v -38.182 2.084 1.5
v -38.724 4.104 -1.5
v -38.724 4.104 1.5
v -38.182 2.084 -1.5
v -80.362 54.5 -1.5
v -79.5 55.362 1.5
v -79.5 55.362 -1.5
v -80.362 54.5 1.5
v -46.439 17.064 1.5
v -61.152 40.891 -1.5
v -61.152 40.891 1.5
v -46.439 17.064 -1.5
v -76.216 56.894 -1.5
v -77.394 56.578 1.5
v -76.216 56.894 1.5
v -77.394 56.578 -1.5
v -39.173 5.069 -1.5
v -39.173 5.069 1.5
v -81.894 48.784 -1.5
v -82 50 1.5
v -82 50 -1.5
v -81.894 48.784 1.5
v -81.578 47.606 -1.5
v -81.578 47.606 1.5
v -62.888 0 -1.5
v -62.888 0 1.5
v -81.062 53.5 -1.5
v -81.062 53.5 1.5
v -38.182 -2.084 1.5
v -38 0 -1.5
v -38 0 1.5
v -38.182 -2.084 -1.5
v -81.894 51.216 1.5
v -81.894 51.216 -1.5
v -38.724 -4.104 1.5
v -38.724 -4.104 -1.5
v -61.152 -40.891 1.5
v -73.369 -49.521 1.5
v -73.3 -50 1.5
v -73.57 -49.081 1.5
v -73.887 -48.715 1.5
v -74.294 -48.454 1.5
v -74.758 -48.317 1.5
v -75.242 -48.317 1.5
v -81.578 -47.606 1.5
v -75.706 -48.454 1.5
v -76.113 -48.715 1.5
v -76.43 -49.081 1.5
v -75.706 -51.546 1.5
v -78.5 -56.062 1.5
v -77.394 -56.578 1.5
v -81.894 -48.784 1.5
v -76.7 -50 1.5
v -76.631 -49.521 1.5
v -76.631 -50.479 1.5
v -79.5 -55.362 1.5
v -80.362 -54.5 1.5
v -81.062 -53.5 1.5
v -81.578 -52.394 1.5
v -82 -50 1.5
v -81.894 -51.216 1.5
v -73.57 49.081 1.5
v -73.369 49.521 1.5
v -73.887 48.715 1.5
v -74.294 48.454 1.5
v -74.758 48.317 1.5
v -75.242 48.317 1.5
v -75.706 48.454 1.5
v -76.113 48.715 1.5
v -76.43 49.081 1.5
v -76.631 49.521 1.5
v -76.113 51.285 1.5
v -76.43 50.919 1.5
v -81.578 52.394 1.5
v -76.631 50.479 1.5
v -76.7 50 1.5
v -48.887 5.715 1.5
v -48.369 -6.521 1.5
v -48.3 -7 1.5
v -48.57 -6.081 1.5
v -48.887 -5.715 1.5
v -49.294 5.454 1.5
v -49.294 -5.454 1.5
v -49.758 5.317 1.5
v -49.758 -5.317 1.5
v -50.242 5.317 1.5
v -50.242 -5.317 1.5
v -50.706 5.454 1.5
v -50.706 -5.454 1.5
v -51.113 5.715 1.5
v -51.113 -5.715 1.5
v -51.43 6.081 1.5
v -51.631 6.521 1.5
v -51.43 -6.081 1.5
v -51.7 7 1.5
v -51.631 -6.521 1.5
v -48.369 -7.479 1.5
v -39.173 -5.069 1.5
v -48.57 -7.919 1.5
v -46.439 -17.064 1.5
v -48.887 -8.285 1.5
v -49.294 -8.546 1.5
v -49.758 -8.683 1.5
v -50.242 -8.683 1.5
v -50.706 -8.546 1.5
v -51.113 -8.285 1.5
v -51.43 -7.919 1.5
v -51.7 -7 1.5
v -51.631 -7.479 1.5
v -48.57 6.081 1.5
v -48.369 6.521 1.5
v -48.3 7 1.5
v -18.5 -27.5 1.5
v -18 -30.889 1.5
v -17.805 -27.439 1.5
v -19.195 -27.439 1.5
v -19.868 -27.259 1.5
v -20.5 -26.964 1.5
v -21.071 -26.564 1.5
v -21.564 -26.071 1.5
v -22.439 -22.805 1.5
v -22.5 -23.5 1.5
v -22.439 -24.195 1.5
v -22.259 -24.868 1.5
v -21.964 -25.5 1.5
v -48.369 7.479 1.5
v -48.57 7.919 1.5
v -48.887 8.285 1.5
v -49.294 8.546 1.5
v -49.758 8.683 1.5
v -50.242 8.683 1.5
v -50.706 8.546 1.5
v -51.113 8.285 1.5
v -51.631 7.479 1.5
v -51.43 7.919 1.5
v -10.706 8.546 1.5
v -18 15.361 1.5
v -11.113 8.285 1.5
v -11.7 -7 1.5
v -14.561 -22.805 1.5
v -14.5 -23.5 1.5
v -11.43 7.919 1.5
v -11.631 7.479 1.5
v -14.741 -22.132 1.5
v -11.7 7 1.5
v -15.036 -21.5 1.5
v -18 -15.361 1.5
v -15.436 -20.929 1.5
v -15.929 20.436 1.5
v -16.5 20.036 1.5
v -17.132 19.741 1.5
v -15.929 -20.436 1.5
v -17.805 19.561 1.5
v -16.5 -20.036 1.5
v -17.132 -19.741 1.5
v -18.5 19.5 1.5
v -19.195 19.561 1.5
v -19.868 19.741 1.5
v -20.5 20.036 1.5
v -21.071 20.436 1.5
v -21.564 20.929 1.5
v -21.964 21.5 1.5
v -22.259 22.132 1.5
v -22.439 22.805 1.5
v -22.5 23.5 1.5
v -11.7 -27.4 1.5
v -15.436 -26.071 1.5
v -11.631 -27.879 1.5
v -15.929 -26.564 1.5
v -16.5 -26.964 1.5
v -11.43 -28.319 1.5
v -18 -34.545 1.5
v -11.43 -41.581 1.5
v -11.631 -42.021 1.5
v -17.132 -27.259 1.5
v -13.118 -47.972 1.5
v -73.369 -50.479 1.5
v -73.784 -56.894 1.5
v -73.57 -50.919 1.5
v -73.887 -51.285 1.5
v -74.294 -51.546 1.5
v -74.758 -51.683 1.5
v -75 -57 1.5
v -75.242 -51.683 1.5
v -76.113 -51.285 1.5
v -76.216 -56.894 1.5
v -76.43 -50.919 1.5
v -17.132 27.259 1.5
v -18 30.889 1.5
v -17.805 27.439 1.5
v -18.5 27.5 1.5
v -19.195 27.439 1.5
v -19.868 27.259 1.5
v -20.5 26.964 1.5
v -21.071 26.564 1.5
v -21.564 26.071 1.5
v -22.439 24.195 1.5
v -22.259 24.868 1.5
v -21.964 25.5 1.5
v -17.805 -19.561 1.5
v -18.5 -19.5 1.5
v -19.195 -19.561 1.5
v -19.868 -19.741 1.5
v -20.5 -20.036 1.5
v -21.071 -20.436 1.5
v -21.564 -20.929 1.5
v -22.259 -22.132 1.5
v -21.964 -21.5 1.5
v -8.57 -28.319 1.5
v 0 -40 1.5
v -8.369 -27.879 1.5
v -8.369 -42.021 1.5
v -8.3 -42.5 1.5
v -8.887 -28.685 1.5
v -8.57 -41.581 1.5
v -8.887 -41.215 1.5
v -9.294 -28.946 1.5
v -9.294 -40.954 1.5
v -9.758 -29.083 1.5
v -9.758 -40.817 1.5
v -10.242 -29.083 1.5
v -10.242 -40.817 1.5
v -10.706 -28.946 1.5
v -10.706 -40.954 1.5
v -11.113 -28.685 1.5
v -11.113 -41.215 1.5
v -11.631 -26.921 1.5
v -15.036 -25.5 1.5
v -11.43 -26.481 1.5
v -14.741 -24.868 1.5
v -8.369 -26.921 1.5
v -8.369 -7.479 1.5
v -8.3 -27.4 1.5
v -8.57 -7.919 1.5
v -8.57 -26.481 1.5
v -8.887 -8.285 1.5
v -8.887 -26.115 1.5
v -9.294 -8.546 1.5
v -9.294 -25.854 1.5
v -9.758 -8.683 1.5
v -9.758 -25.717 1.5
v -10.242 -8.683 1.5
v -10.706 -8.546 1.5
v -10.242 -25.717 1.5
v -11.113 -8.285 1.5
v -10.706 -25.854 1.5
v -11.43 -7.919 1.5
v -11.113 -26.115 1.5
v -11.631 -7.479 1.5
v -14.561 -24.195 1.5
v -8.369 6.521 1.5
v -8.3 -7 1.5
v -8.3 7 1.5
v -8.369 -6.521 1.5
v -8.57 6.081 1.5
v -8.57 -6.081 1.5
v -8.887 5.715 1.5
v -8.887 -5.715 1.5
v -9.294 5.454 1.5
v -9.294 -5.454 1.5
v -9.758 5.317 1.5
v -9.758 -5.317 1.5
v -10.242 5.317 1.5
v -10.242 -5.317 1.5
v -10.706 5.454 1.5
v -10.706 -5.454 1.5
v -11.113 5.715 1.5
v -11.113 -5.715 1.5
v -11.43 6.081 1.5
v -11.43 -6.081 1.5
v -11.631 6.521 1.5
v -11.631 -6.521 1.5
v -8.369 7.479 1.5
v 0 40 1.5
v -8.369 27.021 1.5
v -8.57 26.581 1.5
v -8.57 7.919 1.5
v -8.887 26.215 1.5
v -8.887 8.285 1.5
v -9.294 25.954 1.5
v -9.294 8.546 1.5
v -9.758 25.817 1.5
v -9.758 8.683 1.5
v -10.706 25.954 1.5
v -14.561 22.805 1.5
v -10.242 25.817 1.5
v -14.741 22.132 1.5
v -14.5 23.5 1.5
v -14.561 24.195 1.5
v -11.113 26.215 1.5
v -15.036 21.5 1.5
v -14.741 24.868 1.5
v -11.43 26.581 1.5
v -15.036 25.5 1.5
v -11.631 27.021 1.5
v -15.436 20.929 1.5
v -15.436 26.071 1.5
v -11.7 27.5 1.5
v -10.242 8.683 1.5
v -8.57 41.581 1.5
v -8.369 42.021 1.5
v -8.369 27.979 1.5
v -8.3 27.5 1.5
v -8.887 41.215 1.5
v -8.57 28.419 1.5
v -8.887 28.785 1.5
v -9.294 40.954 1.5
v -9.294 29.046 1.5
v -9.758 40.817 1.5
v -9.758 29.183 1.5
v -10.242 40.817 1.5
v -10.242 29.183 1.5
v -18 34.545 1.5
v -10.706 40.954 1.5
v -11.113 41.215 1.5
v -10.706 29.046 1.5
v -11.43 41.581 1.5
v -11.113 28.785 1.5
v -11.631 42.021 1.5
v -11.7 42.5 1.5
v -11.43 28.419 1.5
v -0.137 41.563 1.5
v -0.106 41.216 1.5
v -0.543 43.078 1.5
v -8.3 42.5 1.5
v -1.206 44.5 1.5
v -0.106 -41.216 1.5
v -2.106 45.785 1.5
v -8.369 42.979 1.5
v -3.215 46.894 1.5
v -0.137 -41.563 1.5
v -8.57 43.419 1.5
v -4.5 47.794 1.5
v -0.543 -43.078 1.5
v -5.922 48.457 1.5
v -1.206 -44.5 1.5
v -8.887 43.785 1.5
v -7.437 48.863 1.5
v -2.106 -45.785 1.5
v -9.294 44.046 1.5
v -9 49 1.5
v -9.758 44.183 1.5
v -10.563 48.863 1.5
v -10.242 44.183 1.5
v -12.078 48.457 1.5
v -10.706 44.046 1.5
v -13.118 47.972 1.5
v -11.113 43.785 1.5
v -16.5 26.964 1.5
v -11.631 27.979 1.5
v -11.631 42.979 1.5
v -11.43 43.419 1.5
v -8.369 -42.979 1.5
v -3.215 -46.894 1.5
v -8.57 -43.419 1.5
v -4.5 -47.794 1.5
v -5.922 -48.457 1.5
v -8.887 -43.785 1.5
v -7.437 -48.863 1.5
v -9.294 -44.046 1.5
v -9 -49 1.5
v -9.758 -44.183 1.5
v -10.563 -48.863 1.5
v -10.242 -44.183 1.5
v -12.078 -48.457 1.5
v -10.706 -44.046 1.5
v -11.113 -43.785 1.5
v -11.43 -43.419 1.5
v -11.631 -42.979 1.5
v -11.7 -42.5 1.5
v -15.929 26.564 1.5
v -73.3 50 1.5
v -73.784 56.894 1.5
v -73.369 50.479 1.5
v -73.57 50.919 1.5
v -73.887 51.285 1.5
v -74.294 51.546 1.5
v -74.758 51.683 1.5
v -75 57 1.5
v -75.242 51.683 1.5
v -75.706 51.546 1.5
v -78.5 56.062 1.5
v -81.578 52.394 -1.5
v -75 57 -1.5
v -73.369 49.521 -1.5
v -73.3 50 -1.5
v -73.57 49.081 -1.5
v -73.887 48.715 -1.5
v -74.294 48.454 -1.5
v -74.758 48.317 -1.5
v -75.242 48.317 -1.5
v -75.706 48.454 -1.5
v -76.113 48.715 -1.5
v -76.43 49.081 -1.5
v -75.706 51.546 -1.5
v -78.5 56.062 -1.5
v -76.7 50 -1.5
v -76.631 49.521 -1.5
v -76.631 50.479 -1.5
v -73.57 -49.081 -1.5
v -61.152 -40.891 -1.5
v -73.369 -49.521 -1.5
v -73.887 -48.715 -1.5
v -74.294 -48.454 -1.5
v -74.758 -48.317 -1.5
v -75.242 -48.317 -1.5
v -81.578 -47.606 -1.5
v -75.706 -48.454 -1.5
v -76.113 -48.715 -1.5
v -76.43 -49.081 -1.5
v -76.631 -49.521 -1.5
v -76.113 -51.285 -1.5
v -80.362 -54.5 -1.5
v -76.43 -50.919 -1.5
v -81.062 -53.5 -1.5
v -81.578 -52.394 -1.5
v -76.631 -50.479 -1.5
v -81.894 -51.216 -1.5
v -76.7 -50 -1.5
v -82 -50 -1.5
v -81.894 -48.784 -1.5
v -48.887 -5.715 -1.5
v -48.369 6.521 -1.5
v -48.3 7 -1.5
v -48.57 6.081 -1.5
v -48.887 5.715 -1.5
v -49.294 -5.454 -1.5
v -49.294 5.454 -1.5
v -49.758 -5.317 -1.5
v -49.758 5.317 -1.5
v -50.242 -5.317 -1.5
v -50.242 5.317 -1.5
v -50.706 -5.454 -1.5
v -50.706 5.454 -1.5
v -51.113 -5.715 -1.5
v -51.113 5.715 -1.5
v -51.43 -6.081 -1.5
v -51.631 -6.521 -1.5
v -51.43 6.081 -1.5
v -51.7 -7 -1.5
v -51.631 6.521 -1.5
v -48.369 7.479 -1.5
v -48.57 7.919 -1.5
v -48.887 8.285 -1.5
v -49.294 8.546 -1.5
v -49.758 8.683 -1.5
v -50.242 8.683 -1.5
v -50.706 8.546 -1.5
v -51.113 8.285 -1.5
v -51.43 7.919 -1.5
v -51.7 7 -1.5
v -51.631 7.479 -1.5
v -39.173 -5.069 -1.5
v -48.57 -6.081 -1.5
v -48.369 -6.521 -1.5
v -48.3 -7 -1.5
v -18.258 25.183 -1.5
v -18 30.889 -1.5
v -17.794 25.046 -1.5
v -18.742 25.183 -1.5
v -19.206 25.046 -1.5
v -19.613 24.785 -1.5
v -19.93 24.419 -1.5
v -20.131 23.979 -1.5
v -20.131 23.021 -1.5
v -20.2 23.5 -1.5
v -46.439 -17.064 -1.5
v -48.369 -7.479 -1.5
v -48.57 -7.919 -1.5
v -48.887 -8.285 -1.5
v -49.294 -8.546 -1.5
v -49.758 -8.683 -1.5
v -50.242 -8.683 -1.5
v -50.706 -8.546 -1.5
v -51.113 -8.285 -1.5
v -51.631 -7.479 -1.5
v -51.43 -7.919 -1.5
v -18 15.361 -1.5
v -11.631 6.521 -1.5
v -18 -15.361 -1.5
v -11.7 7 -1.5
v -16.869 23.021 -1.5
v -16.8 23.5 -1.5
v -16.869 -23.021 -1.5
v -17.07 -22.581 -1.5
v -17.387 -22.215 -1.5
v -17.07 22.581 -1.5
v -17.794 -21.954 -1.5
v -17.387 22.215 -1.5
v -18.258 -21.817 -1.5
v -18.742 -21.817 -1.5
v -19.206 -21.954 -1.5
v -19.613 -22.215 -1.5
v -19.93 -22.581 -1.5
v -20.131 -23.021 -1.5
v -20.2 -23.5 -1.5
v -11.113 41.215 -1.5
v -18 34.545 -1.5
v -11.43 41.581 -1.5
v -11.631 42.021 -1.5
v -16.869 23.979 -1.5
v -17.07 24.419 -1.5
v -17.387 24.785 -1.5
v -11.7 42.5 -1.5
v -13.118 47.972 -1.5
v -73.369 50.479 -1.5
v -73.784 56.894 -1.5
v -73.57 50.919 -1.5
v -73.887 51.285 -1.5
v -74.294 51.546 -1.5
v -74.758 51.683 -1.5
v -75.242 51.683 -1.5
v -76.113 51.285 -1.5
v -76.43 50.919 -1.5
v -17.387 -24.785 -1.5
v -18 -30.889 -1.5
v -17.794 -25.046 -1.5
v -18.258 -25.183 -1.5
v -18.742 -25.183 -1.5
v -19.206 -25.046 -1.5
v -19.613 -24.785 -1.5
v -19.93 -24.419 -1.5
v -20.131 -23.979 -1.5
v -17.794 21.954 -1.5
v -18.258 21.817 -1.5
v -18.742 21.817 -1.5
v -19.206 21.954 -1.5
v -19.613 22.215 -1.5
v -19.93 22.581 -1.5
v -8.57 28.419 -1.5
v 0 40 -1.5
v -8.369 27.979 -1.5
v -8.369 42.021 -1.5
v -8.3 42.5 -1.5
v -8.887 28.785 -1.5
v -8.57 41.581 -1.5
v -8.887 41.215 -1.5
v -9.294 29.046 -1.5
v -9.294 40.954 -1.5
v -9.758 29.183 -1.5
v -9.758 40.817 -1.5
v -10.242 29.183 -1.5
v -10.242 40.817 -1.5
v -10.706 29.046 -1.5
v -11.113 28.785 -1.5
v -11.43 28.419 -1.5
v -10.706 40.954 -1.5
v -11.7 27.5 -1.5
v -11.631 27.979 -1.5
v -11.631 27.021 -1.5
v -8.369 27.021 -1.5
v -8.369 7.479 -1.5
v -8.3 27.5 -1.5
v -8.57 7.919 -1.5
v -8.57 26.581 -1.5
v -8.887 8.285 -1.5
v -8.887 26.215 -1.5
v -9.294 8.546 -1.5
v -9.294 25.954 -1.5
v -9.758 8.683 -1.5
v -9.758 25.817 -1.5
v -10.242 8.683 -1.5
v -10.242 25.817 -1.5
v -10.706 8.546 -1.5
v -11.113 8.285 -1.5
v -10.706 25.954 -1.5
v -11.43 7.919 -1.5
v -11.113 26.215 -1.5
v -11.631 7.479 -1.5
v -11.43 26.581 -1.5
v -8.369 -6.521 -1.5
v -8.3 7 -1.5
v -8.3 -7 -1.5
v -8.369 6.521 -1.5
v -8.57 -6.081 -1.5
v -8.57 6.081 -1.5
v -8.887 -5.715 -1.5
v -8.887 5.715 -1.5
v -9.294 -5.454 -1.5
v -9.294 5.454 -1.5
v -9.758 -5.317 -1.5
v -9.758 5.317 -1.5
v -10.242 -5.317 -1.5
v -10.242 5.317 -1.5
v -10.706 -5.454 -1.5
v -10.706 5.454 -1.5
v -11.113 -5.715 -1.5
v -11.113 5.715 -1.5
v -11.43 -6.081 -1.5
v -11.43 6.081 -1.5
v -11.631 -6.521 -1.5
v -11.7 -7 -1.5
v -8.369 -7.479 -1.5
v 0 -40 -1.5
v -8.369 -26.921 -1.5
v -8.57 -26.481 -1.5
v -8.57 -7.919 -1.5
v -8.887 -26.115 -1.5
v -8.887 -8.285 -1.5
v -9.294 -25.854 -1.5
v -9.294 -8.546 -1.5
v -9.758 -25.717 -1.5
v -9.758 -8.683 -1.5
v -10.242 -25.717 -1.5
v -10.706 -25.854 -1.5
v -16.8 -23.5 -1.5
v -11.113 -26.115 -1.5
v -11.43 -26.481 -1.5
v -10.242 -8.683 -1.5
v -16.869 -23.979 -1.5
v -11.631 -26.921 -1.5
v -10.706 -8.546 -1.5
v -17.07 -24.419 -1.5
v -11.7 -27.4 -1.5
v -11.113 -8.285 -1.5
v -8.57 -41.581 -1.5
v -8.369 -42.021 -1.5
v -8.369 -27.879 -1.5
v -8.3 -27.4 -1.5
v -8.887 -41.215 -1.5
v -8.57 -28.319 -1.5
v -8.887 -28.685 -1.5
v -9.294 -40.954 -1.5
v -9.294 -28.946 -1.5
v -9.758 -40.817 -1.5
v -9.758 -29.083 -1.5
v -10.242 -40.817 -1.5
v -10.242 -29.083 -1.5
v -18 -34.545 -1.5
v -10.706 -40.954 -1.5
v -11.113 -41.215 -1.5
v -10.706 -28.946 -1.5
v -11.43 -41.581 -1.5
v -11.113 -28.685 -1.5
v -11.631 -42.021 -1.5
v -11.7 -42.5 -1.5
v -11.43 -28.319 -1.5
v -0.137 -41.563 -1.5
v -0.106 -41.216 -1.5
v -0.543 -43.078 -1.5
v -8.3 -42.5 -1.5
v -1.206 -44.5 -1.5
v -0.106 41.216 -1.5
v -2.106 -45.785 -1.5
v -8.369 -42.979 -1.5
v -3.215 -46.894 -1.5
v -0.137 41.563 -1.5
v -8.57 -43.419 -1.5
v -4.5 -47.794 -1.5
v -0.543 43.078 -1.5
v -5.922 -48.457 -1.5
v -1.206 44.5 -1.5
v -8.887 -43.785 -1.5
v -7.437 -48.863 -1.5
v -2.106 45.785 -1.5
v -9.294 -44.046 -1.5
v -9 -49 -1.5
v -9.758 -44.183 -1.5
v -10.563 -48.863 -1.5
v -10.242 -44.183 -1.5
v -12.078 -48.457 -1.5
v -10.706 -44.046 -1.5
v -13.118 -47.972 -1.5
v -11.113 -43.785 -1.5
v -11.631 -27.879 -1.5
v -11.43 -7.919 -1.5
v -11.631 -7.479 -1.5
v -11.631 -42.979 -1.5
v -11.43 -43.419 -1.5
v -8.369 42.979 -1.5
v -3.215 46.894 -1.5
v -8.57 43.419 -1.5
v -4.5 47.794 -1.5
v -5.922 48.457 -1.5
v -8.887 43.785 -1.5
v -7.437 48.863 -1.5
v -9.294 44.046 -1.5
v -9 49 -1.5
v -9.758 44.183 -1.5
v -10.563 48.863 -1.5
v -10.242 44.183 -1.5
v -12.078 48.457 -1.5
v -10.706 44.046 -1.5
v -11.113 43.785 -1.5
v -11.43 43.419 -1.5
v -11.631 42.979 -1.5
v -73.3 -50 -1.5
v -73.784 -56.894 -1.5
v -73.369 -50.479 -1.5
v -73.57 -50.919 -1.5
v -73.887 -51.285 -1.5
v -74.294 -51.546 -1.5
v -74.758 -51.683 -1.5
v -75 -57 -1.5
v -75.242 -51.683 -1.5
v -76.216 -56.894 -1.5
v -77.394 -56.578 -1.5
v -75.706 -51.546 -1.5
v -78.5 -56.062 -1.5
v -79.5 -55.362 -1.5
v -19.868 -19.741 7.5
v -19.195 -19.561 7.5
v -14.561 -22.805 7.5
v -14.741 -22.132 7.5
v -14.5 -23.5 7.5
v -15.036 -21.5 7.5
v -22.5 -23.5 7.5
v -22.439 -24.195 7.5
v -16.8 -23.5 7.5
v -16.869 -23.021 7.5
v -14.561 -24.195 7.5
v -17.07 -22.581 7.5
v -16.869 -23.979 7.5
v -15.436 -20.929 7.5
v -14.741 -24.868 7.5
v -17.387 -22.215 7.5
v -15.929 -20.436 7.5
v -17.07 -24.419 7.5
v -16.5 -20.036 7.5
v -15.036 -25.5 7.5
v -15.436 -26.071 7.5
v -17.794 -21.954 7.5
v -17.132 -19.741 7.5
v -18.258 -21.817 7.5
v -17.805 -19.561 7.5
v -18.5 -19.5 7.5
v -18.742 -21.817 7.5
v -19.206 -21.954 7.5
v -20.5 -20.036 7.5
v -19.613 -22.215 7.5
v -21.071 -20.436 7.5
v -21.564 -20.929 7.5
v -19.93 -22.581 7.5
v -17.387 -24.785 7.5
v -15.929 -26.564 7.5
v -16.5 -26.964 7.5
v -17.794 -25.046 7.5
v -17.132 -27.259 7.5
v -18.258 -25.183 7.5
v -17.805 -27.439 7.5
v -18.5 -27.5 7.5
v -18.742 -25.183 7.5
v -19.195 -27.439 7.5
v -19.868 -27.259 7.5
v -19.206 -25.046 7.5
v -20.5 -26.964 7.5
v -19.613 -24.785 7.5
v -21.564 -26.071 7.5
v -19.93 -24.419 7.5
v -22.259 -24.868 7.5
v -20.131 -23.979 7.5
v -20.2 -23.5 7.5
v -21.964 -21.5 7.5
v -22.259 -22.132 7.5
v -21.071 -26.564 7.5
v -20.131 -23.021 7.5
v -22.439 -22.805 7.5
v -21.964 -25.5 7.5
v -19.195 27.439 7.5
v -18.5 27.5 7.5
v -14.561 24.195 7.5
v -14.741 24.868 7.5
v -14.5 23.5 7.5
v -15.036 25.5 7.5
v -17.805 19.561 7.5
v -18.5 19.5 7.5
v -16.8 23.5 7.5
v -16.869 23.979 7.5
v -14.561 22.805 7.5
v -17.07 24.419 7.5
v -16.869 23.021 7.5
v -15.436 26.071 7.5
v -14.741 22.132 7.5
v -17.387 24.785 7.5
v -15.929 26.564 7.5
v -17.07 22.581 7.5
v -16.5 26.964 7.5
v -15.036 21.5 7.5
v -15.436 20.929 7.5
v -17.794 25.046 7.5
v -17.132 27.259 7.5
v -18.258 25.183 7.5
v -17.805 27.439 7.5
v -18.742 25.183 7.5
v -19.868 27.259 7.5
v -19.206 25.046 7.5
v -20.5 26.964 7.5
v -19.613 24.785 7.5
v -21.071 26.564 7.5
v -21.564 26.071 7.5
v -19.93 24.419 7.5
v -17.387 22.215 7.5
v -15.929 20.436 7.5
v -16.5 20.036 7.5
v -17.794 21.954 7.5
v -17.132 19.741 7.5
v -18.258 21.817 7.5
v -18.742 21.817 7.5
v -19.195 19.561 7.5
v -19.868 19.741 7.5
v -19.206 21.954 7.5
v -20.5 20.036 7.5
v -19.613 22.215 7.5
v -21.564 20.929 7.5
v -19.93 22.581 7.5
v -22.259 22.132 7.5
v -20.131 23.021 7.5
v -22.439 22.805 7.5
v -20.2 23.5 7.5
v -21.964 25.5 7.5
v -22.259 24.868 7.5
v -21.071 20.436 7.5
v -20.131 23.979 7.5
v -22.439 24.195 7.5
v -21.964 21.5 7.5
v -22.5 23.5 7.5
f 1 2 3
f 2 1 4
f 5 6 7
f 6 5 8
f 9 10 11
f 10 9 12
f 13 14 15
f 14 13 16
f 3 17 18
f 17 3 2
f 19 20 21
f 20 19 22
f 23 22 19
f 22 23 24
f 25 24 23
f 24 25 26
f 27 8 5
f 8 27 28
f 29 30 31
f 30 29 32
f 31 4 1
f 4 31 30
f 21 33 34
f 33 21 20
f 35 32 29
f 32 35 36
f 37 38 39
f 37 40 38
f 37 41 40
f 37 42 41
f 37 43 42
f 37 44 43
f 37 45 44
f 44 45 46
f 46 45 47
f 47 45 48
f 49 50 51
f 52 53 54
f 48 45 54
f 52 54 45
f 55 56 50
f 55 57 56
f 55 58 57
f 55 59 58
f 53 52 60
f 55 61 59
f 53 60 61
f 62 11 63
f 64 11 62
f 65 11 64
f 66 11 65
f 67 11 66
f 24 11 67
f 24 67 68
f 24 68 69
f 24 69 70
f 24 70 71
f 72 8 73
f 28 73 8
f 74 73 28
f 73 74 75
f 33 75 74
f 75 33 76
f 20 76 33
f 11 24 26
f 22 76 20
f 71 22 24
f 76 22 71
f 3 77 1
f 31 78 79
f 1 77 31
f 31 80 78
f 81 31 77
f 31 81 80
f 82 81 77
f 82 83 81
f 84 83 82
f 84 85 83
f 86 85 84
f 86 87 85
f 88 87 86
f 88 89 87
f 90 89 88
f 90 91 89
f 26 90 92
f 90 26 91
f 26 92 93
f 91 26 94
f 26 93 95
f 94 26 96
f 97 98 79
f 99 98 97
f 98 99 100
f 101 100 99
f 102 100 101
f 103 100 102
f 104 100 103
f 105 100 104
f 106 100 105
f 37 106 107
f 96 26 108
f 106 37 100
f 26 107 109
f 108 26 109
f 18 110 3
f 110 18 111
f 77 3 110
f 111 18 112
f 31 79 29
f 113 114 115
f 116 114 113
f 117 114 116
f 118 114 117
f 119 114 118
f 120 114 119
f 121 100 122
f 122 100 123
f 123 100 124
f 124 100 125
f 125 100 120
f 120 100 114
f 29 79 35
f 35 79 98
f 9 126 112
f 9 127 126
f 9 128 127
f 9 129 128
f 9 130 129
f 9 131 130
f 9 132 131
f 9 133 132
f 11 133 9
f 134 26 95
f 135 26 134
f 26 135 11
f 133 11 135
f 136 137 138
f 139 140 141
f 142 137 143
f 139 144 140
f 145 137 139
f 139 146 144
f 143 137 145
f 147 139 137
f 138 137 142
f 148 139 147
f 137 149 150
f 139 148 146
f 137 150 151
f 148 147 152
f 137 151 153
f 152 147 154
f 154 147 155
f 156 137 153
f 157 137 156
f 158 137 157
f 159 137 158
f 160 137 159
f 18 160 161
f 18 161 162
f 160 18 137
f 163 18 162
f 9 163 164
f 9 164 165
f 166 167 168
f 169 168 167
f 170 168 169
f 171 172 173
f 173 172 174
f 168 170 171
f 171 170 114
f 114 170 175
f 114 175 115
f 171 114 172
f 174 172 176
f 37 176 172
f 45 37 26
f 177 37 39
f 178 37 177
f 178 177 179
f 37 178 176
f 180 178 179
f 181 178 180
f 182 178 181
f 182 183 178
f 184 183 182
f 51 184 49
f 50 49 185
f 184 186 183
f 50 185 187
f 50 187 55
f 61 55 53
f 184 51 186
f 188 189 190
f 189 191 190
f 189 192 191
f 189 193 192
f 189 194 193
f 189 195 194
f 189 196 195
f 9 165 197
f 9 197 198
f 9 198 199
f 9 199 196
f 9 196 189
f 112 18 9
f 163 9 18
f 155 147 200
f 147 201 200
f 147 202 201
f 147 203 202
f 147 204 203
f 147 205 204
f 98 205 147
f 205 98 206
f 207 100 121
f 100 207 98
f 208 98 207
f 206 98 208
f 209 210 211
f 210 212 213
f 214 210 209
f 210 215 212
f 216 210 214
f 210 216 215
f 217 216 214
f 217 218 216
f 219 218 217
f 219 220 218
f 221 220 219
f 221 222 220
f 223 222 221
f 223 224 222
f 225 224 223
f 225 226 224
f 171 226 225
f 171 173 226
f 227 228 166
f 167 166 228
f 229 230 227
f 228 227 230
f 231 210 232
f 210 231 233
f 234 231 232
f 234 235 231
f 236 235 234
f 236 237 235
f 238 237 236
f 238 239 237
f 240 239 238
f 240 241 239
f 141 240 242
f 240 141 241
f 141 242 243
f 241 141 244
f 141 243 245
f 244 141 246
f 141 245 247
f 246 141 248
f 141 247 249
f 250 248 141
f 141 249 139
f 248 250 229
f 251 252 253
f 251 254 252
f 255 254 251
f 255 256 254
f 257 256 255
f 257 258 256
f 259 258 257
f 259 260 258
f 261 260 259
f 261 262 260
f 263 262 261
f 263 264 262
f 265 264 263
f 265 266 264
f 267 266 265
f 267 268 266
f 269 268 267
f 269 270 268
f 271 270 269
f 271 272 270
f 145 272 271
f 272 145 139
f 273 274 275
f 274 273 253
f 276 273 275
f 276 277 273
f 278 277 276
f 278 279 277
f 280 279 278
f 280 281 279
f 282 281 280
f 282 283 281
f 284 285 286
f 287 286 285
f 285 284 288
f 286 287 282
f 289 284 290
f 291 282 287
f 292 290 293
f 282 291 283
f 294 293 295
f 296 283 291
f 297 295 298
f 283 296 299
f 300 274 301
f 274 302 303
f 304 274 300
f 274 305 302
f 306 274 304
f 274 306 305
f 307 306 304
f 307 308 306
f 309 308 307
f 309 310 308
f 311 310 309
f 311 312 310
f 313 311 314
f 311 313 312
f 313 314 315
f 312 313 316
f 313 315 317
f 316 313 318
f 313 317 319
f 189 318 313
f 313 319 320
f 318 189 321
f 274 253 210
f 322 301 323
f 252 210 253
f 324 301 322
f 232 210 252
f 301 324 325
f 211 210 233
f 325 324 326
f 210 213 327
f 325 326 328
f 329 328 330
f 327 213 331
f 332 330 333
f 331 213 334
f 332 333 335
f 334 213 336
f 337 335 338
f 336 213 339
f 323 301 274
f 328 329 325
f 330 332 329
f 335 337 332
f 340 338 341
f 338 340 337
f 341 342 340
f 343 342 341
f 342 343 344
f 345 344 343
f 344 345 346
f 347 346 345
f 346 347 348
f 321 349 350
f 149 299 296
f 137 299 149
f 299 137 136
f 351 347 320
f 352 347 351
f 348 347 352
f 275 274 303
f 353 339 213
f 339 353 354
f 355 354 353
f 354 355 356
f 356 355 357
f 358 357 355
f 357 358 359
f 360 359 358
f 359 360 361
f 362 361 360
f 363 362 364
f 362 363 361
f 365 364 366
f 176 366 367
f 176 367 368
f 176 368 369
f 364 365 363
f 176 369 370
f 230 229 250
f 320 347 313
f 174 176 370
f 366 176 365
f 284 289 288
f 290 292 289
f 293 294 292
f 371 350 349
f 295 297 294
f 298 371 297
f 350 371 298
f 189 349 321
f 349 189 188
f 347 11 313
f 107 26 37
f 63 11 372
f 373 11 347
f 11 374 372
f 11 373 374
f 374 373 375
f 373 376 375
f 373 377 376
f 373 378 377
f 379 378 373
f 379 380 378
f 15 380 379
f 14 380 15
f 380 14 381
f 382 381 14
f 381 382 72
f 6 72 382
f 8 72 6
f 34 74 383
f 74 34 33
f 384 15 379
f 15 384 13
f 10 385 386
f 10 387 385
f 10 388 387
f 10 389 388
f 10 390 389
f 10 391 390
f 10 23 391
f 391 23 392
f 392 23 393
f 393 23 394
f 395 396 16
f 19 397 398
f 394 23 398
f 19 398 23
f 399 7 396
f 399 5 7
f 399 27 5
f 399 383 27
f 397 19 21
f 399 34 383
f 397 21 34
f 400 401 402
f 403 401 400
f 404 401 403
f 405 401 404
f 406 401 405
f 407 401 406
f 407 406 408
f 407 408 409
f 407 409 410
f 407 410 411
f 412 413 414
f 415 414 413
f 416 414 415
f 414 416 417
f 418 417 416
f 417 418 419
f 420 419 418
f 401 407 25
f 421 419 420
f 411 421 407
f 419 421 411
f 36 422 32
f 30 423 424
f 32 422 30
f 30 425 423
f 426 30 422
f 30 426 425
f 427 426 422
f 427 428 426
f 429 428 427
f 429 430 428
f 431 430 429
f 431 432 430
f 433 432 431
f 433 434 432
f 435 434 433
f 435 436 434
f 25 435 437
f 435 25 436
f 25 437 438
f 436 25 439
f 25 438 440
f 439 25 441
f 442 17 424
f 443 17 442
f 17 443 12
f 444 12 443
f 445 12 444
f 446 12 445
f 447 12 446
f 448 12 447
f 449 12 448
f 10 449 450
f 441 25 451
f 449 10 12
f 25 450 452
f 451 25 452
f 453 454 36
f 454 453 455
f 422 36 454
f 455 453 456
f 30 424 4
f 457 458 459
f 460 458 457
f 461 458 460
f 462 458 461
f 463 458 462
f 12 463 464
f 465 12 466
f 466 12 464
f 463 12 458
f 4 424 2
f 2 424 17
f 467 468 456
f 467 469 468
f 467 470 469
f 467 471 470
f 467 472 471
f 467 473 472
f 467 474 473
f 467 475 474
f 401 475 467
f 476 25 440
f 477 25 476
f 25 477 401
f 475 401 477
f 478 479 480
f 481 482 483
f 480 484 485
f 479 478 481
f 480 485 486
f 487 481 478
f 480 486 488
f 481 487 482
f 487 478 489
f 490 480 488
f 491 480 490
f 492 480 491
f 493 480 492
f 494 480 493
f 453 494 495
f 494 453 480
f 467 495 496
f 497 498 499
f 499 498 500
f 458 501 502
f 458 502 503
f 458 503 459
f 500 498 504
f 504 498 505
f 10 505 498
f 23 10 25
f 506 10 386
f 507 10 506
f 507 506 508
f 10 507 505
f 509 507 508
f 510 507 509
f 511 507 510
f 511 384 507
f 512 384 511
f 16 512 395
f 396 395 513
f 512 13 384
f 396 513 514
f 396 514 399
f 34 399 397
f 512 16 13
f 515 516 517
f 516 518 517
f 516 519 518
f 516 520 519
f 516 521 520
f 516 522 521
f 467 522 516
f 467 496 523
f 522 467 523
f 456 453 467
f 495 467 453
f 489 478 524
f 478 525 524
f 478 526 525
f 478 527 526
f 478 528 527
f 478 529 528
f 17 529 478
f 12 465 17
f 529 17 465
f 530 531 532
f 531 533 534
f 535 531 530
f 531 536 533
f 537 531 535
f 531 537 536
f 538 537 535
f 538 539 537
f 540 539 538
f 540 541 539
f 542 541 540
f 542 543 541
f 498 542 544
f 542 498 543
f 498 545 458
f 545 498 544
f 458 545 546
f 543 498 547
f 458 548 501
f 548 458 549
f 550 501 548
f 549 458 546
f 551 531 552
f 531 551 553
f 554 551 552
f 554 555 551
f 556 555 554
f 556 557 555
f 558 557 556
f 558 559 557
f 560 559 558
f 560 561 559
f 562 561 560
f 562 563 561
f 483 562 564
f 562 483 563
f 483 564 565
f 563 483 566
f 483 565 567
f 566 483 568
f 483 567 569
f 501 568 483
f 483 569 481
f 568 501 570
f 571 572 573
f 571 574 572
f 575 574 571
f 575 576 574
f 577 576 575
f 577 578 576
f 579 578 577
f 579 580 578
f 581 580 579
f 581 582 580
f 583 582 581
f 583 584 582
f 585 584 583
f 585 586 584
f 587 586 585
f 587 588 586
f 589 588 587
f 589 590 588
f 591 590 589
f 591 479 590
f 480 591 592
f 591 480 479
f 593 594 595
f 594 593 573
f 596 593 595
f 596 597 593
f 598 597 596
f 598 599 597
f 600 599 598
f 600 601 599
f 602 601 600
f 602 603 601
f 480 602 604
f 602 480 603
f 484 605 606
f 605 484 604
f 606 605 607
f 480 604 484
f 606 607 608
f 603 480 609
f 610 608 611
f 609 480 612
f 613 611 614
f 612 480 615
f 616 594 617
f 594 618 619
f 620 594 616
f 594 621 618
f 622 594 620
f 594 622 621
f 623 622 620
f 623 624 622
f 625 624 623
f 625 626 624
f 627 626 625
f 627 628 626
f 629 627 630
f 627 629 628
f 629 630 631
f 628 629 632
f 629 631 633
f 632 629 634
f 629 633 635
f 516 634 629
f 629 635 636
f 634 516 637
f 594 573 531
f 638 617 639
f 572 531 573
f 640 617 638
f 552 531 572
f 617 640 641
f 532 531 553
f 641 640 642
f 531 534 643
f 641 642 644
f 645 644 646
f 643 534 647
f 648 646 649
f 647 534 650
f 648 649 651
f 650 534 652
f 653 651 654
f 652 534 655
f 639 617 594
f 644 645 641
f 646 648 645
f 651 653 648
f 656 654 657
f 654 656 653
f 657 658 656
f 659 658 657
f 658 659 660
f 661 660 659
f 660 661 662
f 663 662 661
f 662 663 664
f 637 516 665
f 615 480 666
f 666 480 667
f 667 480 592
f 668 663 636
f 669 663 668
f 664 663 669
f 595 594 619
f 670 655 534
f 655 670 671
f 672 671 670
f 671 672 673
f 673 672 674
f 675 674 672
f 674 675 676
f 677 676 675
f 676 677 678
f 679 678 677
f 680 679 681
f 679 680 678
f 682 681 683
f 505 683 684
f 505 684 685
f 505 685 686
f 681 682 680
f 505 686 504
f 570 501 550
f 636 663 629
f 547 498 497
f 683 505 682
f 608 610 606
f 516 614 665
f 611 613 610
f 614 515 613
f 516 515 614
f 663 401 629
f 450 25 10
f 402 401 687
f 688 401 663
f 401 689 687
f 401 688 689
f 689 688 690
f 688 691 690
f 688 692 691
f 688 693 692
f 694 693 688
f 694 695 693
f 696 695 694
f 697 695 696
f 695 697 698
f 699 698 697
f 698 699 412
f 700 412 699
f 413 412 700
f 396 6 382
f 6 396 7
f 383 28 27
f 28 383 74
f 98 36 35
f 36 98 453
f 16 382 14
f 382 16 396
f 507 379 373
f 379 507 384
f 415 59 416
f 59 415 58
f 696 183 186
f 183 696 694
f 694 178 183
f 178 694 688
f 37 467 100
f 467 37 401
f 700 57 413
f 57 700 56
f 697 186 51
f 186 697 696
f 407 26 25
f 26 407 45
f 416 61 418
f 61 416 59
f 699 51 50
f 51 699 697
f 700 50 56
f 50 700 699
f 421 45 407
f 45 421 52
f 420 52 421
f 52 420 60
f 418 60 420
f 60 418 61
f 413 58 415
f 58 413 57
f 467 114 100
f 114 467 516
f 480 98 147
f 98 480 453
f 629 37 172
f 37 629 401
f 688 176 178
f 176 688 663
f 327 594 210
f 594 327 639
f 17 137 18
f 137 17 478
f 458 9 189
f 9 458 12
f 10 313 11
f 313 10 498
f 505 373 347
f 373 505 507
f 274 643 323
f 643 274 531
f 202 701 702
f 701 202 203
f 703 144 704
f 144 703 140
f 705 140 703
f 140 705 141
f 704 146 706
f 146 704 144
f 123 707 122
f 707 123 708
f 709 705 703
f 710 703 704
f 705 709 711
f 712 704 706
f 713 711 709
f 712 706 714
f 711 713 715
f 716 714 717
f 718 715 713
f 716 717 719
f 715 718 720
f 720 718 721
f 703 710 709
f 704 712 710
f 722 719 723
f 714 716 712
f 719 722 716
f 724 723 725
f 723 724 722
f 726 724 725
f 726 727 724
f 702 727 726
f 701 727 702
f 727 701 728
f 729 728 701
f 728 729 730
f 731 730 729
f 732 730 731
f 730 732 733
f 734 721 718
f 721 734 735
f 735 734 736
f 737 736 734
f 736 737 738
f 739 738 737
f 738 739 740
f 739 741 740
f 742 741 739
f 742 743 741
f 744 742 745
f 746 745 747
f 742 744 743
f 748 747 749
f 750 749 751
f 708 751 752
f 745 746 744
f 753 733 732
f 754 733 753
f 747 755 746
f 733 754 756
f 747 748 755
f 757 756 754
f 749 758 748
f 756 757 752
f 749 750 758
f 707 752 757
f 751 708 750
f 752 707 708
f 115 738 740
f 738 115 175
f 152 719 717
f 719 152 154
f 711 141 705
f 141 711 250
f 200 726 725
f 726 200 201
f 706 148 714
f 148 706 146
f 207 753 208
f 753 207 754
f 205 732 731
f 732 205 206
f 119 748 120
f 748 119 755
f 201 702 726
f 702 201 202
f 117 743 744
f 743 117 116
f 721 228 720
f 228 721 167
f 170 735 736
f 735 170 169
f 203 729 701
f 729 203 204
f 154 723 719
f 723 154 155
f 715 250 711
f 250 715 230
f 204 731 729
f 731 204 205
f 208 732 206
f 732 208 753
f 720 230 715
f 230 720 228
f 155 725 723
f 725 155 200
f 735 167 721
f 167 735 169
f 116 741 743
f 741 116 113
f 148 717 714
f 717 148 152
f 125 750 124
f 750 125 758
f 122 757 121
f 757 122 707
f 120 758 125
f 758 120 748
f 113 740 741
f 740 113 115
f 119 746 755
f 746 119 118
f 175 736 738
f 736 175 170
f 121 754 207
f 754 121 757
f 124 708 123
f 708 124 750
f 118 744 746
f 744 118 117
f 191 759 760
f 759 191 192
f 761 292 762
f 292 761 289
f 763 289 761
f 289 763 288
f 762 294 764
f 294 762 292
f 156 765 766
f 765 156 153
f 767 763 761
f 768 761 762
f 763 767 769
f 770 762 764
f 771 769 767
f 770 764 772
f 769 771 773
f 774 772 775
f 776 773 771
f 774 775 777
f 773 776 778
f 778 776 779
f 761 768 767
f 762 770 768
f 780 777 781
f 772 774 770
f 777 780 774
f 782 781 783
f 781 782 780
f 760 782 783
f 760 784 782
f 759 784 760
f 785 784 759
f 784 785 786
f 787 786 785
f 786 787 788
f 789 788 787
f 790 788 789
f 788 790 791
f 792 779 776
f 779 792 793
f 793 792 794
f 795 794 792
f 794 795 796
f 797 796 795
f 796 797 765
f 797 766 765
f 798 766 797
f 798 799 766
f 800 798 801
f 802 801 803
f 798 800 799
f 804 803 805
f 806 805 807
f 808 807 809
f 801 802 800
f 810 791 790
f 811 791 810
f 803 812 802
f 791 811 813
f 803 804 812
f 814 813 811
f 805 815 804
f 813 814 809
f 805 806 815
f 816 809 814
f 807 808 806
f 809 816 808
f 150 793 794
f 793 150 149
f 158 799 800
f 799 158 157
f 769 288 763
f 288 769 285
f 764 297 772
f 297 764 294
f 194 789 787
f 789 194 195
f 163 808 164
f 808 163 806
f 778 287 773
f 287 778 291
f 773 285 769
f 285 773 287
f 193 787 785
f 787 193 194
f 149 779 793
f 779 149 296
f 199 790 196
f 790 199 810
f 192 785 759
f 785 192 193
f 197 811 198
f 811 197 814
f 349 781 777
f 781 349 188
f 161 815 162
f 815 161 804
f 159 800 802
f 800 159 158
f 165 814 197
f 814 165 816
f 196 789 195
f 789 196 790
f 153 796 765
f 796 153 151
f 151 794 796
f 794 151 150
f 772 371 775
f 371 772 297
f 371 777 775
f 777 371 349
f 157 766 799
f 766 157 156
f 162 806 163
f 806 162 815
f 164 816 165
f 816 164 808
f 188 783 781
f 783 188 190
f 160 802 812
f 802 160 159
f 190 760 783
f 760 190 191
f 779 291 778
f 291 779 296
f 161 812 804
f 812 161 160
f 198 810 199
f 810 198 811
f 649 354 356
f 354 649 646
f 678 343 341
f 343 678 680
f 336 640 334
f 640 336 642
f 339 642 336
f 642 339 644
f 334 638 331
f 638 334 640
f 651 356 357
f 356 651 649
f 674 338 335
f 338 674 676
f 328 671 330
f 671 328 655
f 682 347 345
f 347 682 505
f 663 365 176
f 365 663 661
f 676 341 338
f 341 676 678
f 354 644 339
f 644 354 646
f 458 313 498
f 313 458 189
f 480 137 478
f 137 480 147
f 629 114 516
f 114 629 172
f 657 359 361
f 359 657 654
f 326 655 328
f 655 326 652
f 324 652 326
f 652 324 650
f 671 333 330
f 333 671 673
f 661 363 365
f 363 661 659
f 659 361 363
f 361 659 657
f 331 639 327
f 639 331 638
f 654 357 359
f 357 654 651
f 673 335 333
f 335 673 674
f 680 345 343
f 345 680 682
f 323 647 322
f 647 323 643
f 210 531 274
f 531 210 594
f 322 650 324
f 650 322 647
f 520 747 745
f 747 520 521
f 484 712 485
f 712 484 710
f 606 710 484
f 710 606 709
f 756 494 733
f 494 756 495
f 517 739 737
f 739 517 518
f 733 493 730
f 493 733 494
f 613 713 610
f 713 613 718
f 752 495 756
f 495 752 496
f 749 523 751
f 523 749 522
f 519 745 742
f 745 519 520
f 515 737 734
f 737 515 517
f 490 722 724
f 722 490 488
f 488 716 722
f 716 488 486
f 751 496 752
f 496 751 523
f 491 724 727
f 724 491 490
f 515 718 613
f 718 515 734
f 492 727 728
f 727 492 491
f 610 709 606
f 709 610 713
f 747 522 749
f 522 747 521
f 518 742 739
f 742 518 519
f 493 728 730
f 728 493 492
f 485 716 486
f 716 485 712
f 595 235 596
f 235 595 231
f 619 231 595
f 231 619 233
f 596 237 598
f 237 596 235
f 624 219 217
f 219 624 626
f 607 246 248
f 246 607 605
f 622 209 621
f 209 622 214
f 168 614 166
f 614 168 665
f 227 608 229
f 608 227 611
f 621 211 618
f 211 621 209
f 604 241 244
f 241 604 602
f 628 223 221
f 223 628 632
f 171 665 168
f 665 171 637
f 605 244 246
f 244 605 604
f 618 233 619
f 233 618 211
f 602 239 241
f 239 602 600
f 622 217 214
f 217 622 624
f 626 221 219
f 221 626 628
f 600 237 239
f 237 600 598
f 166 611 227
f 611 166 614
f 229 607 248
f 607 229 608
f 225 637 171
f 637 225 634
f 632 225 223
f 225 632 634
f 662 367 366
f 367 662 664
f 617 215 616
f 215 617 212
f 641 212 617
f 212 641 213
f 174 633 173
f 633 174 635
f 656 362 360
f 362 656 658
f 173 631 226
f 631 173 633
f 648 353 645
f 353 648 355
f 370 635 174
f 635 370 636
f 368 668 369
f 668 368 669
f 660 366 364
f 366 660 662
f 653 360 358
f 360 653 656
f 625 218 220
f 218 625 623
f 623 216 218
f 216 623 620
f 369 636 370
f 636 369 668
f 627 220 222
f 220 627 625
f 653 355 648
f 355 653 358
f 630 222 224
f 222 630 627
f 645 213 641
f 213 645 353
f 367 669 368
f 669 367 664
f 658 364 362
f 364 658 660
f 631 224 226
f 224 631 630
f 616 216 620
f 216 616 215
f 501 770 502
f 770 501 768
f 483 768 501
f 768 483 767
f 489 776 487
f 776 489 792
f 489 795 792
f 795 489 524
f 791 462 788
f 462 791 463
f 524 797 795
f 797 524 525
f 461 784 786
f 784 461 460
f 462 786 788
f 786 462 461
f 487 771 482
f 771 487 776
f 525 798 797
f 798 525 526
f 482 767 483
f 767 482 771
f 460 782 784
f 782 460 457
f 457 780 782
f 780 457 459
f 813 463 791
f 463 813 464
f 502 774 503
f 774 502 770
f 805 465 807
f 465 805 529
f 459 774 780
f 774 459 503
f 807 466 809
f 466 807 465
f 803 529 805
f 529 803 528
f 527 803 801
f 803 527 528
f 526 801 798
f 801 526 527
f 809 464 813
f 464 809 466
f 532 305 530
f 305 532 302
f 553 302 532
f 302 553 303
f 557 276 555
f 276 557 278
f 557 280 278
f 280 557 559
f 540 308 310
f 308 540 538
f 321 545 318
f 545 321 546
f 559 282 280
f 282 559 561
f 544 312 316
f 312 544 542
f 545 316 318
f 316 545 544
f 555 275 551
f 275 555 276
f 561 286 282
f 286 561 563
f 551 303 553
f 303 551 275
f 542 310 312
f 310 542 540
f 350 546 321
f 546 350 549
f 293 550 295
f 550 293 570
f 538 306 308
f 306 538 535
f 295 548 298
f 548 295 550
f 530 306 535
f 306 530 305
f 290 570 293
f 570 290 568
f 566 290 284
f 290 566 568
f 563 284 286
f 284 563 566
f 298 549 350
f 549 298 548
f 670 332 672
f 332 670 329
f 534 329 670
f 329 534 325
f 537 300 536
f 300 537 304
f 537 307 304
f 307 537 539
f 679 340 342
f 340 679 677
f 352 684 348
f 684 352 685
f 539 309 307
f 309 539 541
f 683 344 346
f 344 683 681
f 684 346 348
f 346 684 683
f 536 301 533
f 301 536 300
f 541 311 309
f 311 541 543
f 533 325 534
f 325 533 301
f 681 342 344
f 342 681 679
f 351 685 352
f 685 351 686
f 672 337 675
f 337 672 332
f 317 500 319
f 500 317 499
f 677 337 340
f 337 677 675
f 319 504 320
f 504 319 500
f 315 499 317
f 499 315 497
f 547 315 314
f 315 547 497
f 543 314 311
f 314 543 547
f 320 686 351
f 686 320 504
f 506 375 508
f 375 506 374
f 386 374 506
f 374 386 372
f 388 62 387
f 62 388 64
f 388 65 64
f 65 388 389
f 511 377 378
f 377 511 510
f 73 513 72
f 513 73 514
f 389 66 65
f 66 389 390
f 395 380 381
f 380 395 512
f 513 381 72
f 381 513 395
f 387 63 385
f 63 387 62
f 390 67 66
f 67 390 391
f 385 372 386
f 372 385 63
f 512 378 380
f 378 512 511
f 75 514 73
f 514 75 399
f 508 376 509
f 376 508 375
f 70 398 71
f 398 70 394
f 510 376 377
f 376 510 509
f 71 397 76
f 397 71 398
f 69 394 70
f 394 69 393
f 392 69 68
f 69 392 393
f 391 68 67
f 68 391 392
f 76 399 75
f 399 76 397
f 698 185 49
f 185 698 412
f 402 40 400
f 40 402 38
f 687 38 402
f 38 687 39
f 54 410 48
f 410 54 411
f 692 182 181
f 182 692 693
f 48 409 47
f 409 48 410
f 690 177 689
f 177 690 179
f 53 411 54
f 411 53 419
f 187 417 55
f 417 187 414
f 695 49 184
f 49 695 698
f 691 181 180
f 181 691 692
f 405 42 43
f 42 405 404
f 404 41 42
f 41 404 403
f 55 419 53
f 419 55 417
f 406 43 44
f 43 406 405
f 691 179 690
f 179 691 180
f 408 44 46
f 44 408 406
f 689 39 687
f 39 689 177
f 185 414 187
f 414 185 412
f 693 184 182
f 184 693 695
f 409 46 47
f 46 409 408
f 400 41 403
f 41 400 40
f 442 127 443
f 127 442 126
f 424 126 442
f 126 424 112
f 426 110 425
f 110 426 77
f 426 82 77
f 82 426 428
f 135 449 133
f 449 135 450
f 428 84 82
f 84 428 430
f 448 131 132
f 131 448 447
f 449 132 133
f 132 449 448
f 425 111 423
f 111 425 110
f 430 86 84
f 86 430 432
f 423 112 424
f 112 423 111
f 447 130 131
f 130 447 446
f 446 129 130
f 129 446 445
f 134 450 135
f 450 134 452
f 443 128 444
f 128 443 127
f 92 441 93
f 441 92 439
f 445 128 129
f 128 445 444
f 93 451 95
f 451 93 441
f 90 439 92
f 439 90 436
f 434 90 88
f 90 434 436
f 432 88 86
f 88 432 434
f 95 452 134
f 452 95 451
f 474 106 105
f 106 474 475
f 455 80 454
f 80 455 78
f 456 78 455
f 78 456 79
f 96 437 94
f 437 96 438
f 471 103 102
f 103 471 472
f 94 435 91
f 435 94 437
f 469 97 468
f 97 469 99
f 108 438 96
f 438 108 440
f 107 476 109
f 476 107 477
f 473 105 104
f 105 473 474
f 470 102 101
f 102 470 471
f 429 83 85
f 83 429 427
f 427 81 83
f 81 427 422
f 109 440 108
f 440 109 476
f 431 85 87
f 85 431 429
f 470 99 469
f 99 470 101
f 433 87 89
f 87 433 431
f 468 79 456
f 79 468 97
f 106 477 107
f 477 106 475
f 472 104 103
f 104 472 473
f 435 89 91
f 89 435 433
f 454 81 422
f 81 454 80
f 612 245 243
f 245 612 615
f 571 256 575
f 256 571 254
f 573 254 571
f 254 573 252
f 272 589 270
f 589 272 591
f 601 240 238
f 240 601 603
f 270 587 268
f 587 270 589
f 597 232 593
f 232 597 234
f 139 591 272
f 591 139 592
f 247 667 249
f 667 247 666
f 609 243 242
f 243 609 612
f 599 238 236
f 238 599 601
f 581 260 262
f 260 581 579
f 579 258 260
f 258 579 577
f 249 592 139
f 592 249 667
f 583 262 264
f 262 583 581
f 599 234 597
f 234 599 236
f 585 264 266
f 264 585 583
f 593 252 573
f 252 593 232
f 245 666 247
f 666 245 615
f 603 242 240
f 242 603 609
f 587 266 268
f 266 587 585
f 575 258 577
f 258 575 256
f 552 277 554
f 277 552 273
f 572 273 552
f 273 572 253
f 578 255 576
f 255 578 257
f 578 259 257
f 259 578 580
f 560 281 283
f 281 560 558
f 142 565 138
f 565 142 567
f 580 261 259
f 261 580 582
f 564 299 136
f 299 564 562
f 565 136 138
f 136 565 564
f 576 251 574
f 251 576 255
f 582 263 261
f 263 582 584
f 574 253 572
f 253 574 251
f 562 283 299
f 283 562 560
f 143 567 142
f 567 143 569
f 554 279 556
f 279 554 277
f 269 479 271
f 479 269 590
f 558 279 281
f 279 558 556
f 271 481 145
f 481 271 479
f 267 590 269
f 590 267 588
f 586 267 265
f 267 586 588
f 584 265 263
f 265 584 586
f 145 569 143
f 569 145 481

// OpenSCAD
$fa=10; $fs=0.5;

difference(){
    
    union(){
        hull(){
            translate([-75,50,0]) cylinder(h=3, r=7, center=true);
            translate([-50,0, 0]) cylinder(h=3, r=12, center=true);
        }
        
        hull(){
            translate([-75,-50,0]) cylinder(h=3, r=7, center=true);
            translate([-50,0, 0]) cylinder(h=3, r=12, center=true);
        }
        
        hull(){
            translate([-45,-10,0]) cylinder(h=3, r=7, center=true);
            translate([-9,-27.5,0]) cylinder(h=3, r=7, center=true);
        }
        
        hull(){
            translate([-75,-50,0]) cylinder(h=3, r=7, center=true);
            translate([-7,-40, 0]) cylinder(h=3, r=7, center=true);
        }
        
        hull(){
            translate([-45,10,0]) cylinder(h=3, r=7, center=true);
            translate([-9,27.5,0]) cylinder(h=3, r=7, center=true);
        }
        
        hull(){
            translate([-75,50,0]) cylinder(h=3, r=7, center=true);
            translate([-7,40, 0]) cylinder(h=3, r=7, center=true);
        }
        
       
        translate([-18.5, -23.5, 4.5]) cylinder(h=6, r=4, center=true); //упор под винт ремня
        translate([-18.5, 23.5, 4.5]) cylinder(h=6, r=4, center=true); //упор под винт ремня
        
        hull(){
            translate([-9,40,0]) cylinder(h=3, r=9, center=true);
            translate([-9,-40,0]) cylinder(h=3, r=9, center=true);
            }
      
    }
    
    union(){
        translate([-18.5, -23.5, 4]) cylinder(h=11.01, r=1.7, center=true); //под винт ремня
        
        translate([-10, -27.4, 4]) cylinder(h=11.01, r=1.7, center=true); // под прижим lm6uu
        translate([10, -27.5, 4]) cylinder(h=11.01, r=1.7, center=true);
        translate([-10, -42.5, 4]) cylinder(h=11.01, r=1.7, center=true);
        translate([10, -42.5, 4]) cylinder(h=11.01, r=1.7, center=true);
        
        translate([-18.5, 23.5, 4]) cylinder(h=11.01, r=1.7, center=true); //под винт ремня
        
        translate([-10, 27.5, 4]) cylinder(h=11.01, r=1.7, center=true); // под прижим lm6uu
        translate([10, 27.5, 4]) cylinder(h=11.01, r=1.7, center=true);
        translate([-10, 42.5, 4]) cylinder(h=11.01, r=1.7, center=true);
        translate([10, 42.5, 4]) cylinder(h=11.01, r=1.7, center=true);
        
        translate([-75,50,0]) cylinder(h=3.01, r=1.7, center=true); //под столик
        translate([-75,-50,0]) cylinder(h=3.01, r=1.7, center=true);
        
        translate([-50,7,0]) cylinder(h=3.01, r=1.7, center=true); //под планку
        translate([-50,-7,0]) cylinder(h=3.01, r=1.7, center=true);
        translate([-10,-7,0]) cylinder(h=3.01, r=1.7, center=true);
        translate([-10,7,0]) cylinder(h=3.01, r=1.7, center=true);
    }
}
